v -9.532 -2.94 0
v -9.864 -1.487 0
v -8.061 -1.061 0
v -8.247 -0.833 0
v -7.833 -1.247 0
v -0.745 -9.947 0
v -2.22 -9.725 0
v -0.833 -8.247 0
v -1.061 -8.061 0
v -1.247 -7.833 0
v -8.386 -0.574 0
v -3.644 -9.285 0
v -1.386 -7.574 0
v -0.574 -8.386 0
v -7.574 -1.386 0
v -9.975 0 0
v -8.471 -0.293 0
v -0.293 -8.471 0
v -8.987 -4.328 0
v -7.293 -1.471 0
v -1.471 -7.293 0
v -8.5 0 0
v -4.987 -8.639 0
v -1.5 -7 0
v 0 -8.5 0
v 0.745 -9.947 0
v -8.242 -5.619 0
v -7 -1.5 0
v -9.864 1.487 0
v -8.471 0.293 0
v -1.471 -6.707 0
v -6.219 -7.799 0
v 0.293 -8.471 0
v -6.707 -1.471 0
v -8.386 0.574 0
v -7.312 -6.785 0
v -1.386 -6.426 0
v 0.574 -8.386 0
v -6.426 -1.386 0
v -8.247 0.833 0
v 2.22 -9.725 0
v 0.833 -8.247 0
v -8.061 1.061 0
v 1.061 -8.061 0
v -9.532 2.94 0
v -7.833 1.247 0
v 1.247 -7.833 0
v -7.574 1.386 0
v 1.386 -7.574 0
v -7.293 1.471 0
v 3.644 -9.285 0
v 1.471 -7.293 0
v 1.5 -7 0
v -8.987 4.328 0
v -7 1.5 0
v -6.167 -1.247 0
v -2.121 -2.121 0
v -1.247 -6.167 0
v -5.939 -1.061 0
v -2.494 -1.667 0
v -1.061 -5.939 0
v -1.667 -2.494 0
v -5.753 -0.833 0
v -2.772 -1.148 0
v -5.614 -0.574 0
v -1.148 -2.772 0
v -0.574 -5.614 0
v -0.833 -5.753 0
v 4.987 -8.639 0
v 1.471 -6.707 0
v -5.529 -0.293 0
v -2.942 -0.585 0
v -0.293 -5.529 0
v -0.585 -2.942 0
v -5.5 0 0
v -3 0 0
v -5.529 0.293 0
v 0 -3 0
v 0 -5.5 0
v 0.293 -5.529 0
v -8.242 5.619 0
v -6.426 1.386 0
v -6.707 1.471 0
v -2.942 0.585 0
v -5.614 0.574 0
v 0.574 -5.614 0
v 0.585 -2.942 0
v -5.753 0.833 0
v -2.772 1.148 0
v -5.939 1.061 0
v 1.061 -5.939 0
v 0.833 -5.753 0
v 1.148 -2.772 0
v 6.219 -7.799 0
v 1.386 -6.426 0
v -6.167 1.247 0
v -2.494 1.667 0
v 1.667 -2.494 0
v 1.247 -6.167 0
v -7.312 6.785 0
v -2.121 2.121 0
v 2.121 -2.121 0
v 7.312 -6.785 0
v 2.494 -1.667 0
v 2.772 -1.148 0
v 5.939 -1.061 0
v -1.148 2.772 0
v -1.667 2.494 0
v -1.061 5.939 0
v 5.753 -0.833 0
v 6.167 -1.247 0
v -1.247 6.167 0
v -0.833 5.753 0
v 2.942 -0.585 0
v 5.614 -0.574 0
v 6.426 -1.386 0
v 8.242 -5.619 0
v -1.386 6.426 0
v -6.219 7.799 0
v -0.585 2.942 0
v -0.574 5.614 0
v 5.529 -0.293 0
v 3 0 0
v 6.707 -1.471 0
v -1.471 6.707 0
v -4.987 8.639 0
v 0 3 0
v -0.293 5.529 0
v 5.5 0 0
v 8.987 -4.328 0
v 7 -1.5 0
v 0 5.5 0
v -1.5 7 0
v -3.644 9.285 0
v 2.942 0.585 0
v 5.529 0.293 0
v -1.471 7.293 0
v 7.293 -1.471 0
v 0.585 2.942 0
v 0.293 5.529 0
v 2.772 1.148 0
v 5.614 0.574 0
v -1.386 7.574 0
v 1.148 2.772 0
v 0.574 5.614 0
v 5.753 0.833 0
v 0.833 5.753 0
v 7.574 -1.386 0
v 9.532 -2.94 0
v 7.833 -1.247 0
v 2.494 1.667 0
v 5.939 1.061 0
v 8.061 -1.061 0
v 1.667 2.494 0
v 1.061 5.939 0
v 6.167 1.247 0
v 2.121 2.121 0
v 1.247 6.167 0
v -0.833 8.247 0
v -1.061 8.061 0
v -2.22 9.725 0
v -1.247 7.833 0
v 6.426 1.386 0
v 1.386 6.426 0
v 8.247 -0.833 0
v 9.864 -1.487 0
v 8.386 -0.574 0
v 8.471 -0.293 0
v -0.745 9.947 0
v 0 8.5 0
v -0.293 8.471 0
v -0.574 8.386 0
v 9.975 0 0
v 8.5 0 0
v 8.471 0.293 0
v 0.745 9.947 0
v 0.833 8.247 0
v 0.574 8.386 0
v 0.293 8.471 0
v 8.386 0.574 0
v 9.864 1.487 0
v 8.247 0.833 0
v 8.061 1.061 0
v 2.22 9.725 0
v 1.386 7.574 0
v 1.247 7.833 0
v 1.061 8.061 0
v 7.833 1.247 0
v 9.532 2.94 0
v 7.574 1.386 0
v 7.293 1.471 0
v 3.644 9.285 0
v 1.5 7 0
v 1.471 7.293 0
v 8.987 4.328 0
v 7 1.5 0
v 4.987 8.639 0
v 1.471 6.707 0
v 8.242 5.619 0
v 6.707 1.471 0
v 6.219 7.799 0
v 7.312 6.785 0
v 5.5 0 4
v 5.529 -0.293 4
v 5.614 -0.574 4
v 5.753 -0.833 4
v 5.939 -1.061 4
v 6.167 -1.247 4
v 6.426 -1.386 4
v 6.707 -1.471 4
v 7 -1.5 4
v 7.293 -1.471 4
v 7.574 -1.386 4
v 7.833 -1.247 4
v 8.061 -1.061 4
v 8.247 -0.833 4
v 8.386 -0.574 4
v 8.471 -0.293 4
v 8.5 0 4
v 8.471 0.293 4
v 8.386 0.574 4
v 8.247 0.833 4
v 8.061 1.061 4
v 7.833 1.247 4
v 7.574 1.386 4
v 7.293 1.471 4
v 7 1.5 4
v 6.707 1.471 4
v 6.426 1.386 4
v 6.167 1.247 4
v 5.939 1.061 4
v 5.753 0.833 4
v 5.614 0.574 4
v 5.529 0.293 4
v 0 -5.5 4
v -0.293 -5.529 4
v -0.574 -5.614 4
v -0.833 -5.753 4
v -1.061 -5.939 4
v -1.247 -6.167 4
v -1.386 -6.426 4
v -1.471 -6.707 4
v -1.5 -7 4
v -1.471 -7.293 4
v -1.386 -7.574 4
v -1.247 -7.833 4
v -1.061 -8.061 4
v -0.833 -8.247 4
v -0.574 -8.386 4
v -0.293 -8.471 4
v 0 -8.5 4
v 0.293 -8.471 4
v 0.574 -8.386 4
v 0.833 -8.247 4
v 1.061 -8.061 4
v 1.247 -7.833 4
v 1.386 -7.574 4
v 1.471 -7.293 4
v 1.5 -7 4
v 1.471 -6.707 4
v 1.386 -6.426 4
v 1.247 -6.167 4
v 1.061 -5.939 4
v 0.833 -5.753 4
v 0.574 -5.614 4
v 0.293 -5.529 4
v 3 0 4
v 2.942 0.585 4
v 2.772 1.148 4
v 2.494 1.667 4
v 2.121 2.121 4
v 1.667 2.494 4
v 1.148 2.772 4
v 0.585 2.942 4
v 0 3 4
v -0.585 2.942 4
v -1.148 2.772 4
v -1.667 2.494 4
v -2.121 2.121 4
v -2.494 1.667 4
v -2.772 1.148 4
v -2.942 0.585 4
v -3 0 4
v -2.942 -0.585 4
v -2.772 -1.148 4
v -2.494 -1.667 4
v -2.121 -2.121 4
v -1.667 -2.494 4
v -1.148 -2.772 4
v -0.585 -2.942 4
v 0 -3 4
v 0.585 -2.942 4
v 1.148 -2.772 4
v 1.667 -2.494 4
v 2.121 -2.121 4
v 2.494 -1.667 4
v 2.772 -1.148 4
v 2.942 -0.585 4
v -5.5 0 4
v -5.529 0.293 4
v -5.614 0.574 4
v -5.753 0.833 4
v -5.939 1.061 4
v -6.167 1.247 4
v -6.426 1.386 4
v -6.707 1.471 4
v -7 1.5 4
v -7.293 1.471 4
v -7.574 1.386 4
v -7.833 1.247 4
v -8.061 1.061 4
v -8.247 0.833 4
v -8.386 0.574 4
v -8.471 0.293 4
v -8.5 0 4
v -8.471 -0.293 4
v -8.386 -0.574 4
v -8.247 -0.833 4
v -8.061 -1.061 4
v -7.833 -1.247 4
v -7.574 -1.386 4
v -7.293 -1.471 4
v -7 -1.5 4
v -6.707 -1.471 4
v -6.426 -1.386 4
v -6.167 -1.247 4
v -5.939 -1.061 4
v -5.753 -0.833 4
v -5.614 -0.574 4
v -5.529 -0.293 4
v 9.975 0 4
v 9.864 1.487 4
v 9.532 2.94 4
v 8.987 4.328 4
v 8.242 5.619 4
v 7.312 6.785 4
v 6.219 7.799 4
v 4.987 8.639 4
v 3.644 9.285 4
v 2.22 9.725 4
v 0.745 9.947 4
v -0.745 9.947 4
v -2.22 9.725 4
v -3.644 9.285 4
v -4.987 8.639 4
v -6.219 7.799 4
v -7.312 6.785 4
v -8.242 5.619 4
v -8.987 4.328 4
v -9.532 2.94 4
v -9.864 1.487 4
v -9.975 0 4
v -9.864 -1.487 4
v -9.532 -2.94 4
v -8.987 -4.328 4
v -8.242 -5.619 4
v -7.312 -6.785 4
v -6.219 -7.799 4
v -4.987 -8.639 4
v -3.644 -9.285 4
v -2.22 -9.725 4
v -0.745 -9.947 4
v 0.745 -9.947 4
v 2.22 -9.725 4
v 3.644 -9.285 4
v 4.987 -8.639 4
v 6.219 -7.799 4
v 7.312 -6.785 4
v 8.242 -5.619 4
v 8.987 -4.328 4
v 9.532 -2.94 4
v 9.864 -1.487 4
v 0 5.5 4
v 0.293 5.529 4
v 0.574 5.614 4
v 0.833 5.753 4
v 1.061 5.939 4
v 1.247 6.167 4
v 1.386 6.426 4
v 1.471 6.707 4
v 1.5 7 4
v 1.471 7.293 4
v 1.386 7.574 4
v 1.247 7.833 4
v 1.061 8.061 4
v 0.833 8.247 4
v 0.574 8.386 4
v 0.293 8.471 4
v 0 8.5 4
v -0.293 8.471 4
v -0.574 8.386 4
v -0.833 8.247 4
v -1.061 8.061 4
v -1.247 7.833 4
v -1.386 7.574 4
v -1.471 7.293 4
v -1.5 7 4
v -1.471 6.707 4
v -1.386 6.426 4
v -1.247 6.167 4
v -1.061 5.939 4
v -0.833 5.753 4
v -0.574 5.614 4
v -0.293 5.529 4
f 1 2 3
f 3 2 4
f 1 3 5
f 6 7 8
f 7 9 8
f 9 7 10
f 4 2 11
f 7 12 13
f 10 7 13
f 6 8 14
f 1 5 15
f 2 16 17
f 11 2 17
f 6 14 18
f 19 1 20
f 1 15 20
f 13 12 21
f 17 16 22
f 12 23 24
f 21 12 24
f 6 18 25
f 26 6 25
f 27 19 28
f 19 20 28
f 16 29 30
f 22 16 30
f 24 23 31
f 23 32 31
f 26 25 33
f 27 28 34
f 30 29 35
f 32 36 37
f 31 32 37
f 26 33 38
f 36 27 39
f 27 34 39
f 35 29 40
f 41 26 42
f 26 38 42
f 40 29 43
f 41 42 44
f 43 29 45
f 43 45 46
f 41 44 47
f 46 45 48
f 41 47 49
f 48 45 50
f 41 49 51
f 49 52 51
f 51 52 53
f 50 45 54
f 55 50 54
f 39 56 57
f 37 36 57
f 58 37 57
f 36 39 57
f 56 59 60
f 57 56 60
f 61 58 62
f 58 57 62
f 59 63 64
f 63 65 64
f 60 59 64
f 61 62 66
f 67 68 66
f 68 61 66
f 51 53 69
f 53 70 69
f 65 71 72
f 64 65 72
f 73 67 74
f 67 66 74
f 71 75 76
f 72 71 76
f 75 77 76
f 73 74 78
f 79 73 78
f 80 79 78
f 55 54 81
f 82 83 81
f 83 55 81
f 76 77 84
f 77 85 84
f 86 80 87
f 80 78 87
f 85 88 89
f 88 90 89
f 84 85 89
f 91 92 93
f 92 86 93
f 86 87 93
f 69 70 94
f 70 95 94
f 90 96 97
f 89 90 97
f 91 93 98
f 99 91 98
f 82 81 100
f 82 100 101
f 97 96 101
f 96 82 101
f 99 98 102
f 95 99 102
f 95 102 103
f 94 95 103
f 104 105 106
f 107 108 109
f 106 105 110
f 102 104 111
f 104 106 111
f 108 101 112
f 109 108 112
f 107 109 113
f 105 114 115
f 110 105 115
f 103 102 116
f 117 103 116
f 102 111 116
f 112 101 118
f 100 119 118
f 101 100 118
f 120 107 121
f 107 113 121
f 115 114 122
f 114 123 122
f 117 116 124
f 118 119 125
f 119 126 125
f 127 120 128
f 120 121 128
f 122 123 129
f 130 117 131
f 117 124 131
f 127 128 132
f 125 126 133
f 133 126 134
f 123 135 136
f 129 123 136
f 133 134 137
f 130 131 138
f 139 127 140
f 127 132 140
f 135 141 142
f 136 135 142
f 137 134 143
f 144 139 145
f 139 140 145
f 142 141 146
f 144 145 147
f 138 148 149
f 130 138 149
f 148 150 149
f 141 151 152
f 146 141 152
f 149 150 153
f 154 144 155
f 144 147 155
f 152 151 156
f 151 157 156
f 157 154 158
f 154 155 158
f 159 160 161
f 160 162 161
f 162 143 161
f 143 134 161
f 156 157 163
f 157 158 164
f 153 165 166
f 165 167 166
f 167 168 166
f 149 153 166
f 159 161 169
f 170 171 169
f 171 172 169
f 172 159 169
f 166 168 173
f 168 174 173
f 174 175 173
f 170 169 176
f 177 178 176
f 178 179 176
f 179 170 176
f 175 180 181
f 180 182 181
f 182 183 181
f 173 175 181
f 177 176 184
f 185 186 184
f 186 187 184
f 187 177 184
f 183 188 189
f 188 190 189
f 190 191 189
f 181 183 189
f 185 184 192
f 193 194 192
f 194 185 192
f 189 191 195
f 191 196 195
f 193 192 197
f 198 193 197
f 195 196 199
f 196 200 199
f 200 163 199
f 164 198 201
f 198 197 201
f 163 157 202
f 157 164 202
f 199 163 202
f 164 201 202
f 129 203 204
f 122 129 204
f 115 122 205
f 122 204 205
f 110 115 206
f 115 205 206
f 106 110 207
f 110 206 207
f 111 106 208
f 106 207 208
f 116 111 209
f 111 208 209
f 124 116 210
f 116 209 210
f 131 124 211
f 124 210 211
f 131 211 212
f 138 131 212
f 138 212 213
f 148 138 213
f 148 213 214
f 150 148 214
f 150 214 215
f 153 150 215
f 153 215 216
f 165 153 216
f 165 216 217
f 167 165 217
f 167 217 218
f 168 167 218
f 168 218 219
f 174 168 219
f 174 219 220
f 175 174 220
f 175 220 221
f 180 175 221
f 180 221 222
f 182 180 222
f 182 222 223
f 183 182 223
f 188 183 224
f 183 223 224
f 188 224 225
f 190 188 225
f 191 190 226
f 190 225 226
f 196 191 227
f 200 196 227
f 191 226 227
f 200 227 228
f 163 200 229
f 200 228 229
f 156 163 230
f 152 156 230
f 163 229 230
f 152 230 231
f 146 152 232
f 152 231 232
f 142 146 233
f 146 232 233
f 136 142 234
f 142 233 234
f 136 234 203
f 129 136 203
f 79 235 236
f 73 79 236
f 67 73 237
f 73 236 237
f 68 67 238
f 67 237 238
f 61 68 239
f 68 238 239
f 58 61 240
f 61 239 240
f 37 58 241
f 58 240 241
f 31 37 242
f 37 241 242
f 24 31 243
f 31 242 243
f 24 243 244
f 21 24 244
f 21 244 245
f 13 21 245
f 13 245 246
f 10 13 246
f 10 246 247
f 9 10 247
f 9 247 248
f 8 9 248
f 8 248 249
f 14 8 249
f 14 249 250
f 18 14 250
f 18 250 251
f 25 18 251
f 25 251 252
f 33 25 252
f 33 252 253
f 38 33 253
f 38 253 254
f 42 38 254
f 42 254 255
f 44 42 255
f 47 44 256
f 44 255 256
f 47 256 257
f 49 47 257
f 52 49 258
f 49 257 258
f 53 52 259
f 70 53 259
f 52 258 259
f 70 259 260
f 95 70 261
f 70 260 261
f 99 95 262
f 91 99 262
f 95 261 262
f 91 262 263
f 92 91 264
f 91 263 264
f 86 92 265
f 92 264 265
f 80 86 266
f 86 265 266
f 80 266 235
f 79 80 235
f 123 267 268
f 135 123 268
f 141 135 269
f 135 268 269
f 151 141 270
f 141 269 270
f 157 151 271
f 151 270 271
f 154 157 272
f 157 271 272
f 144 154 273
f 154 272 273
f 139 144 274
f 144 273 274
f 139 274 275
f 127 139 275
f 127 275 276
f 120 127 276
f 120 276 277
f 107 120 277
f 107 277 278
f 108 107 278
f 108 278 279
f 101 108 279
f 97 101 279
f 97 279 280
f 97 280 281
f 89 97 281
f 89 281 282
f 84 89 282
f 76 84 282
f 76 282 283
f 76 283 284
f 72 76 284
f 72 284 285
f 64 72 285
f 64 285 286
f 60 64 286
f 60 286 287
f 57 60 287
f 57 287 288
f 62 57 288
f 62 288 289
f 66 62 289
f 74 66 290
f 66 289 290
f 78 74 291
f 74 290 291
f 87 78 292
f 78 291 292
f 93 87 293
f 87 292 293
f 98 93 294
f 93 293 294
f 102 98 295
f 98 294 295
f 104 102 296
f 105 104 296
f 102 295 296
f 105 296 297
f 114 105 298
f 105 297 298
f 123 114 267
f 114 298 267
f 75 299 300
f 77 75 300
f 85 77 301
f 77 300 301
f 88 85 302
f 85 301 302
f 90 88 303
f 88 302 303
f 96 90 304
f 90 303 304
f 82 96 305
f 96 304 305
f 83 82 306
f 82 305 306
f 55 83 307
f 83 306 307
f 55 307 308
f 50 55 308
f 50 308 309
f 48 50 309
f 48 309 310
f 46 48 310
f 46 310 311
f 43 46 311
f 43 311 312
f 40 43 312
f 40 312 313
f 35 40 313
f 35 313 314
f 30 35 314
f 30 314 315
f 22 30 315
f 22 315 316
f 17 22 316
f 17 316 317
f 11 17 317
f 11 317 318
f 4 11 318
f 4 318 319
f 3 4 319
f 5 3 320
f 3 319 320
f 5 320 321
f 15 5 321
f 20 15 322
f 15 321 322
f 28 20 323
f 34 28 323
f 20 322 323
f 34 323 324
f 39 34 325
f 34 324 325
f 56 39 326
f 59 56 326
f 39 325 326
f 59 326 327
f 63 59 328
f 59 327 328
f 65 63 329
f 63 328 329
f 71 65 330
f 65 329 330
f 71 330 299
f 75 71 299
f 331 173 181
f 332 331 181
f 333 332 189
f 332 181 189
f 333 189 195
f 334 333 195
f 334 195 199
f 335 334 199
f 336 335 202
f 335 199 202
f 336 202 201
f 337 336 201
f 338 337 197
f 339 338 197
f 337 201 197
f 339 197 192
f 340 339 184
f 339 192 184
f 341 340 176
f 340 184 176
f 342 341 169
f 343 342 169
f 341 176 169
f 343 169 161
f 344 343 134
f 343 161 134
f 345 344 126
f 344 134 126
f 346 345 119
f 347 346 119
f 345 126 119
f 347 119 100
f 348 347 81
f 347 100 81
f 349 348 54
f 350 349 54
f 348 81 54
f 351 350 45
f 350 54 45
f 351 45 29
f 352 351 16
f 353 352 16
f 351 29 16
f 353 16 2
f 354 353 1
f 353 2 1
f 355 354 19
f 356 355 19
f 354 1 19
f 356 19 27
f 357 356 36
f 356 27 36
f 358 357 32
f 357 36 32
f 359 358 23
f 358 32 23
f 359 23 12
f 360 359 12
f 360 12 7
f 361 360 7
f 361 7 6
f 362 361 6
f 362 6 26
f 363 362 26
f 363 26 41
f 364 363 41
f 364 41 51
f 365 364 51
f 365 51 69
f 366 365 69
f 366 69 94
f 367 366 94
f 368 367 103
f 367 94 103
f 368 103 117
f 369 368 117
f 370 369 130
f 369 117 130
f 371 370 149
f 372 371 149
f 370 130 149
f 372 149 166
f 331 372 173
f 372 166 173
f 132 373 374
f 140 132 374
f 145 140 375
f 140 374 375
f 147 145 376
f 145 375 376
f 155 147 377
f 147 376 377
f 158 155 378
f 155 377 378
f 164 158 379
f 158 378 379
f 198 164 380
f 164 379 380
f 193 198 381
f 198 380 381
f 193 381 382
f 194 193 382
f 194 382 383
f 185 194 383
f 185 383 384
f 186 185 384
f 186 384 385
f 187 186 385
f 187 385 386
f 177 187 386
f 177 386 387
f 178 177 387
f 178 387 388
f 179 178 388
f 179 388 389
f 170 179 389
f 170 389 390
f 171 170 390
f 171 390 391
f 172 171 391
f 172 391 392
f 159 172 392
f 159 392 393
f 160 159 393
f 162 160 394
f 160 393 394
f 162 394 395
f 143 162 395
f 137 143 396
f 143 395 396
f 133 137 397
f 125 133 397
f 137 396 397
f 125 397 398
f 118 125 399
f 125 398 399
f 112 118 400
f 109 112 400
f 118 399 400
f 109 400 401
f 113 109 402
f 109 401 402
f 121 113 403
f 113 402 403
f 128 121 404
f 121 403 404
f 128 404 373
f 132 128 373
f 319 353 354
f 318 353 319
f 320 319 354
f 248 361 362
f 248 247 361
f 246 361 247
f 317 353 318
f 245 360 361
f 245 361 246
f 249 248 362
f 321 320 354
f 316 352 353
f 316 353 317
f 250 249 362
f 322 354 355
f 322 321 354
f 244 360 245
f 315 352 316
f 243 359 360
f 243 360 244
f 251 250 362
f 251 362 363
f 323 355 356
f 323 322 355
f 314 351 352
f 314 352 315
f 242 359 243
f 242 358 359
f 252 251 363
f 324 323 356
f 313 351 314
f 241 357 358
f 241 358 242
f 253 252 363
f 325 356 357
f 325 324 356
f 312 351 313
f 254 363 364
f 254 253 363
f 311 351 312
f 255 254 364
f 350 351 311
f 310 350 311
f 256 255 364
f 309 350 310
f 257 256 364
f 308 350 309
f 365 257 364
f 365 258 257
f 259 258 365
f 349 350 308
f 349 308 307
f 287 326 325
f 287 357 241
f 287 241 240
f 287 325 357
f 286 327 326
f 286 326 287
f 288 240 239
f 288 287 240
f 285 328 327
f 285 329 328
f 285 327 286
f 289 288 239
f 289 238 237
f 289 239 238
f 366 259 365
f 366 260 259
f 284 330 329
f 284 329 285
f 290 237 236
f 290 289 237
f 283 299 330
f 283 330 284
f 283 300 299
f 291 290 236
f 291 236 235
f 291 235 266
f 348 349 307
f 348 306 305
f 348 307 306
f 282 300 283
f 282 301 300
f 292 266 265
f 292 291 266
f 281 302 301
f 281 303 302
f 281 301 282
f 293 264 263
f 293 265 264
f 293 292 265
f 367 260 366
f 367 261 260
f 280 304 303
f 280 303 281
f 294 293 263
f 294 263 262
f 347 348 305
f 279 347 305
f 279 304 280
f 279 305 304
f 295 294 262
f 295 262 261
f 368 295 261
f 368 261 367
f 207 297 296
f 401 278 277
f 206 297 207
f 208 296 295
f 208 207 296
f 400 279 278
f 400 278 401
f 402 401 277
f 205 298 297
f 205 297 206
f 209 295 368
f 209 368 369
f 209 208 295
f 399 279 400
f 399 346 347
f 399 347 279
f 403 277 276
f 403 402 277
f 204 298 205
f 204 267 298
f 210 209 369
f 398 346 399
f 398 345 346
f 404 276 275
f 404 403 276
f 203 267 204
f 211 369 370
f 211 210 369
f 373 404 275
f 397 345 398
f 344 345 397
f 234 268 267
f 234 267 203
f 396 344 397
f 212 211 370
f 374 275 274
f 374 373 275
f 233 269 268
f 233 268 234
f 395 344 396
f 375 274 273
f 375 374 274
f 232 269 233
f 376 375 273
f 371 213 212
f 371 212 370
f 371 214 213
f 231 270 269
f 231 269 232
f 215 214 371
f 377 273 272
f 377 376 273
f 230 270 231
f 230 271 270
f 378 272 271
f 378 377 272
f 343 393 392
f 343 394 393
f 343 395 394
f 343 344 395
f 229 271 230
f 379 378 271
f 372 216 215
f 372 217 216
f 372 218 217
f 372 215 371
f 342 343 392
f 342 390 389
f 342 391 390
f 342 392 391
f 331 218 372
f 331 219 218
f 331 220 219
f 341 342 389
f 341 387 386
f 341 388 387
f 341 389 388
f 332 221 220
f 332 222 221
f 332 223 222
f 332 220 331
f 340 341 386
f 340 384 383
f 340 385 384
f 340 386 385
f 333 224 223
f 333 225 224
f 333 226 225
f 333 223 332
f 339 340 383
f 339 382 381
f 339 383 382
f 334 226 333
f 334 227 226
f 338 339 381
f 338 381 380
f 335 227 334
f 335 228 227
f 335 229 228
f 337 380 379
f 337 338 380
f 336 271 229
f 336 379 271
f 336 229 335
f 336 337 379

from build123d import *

# Parameters (mm, degrees)
SKETCH_1_R               = 9.975
EXTRUDE_1_DEPTH          = 4
SKETCH_2_R               = 1.5
CUT_EXTRUDE_1_DEPTH      = 15.662920923
PATTERN_CIRCULAR_1_COUNT = 4
SKETCH_3_R               = 3
CUT_EXTRUDE_2_DEPTH      = 15.662920923


with BuildPart() as part:
    # 草图1 → 凸台-拉伸1 (new body)
    with BuildSketch(Plane.XY):
        Circle(SKETCH_1_R)
    extrude(amount=EXTRUDE_1_DEPTH)

    # 草图2 → 切除-拉伸1 (cut, through all)
    with BuildSketch(Plane.XY.offset(4)):
        with Locations((-7, 0)):
            Circle(SKETCH_2_R)
    cut_extrude_1 = extrude(amount=-CUT_EXTRUDE_1_DEPTH, mode=Mode.SUBTRACT)

    # 阵列(圆周)1: 切除-拉伸1 ×4 about axis
    pattern_circular_1_axis = Axis((0, 0, 0), (0, 0, 1))
    for i in range(1, PATTERN_CIRCULAR_1_COUNT):
        add(cut_extrude_1.rotate(pattern_circular_1_axis, i * 360 / PATTERN_CIRCULAR_1_COUNT), mode=Mode.SUBTRACT)

    # 草图3 → 切除-拉伸2 (cut, through all)
    with BuildSketch(Plane.XY.offset(4)):
        Circle(SKETCH_3_R)
    extrude(amount=-CUT_EXTRUDE_2_DEPTH, mode=Mode.SUBTRACT)


solid = part.part
